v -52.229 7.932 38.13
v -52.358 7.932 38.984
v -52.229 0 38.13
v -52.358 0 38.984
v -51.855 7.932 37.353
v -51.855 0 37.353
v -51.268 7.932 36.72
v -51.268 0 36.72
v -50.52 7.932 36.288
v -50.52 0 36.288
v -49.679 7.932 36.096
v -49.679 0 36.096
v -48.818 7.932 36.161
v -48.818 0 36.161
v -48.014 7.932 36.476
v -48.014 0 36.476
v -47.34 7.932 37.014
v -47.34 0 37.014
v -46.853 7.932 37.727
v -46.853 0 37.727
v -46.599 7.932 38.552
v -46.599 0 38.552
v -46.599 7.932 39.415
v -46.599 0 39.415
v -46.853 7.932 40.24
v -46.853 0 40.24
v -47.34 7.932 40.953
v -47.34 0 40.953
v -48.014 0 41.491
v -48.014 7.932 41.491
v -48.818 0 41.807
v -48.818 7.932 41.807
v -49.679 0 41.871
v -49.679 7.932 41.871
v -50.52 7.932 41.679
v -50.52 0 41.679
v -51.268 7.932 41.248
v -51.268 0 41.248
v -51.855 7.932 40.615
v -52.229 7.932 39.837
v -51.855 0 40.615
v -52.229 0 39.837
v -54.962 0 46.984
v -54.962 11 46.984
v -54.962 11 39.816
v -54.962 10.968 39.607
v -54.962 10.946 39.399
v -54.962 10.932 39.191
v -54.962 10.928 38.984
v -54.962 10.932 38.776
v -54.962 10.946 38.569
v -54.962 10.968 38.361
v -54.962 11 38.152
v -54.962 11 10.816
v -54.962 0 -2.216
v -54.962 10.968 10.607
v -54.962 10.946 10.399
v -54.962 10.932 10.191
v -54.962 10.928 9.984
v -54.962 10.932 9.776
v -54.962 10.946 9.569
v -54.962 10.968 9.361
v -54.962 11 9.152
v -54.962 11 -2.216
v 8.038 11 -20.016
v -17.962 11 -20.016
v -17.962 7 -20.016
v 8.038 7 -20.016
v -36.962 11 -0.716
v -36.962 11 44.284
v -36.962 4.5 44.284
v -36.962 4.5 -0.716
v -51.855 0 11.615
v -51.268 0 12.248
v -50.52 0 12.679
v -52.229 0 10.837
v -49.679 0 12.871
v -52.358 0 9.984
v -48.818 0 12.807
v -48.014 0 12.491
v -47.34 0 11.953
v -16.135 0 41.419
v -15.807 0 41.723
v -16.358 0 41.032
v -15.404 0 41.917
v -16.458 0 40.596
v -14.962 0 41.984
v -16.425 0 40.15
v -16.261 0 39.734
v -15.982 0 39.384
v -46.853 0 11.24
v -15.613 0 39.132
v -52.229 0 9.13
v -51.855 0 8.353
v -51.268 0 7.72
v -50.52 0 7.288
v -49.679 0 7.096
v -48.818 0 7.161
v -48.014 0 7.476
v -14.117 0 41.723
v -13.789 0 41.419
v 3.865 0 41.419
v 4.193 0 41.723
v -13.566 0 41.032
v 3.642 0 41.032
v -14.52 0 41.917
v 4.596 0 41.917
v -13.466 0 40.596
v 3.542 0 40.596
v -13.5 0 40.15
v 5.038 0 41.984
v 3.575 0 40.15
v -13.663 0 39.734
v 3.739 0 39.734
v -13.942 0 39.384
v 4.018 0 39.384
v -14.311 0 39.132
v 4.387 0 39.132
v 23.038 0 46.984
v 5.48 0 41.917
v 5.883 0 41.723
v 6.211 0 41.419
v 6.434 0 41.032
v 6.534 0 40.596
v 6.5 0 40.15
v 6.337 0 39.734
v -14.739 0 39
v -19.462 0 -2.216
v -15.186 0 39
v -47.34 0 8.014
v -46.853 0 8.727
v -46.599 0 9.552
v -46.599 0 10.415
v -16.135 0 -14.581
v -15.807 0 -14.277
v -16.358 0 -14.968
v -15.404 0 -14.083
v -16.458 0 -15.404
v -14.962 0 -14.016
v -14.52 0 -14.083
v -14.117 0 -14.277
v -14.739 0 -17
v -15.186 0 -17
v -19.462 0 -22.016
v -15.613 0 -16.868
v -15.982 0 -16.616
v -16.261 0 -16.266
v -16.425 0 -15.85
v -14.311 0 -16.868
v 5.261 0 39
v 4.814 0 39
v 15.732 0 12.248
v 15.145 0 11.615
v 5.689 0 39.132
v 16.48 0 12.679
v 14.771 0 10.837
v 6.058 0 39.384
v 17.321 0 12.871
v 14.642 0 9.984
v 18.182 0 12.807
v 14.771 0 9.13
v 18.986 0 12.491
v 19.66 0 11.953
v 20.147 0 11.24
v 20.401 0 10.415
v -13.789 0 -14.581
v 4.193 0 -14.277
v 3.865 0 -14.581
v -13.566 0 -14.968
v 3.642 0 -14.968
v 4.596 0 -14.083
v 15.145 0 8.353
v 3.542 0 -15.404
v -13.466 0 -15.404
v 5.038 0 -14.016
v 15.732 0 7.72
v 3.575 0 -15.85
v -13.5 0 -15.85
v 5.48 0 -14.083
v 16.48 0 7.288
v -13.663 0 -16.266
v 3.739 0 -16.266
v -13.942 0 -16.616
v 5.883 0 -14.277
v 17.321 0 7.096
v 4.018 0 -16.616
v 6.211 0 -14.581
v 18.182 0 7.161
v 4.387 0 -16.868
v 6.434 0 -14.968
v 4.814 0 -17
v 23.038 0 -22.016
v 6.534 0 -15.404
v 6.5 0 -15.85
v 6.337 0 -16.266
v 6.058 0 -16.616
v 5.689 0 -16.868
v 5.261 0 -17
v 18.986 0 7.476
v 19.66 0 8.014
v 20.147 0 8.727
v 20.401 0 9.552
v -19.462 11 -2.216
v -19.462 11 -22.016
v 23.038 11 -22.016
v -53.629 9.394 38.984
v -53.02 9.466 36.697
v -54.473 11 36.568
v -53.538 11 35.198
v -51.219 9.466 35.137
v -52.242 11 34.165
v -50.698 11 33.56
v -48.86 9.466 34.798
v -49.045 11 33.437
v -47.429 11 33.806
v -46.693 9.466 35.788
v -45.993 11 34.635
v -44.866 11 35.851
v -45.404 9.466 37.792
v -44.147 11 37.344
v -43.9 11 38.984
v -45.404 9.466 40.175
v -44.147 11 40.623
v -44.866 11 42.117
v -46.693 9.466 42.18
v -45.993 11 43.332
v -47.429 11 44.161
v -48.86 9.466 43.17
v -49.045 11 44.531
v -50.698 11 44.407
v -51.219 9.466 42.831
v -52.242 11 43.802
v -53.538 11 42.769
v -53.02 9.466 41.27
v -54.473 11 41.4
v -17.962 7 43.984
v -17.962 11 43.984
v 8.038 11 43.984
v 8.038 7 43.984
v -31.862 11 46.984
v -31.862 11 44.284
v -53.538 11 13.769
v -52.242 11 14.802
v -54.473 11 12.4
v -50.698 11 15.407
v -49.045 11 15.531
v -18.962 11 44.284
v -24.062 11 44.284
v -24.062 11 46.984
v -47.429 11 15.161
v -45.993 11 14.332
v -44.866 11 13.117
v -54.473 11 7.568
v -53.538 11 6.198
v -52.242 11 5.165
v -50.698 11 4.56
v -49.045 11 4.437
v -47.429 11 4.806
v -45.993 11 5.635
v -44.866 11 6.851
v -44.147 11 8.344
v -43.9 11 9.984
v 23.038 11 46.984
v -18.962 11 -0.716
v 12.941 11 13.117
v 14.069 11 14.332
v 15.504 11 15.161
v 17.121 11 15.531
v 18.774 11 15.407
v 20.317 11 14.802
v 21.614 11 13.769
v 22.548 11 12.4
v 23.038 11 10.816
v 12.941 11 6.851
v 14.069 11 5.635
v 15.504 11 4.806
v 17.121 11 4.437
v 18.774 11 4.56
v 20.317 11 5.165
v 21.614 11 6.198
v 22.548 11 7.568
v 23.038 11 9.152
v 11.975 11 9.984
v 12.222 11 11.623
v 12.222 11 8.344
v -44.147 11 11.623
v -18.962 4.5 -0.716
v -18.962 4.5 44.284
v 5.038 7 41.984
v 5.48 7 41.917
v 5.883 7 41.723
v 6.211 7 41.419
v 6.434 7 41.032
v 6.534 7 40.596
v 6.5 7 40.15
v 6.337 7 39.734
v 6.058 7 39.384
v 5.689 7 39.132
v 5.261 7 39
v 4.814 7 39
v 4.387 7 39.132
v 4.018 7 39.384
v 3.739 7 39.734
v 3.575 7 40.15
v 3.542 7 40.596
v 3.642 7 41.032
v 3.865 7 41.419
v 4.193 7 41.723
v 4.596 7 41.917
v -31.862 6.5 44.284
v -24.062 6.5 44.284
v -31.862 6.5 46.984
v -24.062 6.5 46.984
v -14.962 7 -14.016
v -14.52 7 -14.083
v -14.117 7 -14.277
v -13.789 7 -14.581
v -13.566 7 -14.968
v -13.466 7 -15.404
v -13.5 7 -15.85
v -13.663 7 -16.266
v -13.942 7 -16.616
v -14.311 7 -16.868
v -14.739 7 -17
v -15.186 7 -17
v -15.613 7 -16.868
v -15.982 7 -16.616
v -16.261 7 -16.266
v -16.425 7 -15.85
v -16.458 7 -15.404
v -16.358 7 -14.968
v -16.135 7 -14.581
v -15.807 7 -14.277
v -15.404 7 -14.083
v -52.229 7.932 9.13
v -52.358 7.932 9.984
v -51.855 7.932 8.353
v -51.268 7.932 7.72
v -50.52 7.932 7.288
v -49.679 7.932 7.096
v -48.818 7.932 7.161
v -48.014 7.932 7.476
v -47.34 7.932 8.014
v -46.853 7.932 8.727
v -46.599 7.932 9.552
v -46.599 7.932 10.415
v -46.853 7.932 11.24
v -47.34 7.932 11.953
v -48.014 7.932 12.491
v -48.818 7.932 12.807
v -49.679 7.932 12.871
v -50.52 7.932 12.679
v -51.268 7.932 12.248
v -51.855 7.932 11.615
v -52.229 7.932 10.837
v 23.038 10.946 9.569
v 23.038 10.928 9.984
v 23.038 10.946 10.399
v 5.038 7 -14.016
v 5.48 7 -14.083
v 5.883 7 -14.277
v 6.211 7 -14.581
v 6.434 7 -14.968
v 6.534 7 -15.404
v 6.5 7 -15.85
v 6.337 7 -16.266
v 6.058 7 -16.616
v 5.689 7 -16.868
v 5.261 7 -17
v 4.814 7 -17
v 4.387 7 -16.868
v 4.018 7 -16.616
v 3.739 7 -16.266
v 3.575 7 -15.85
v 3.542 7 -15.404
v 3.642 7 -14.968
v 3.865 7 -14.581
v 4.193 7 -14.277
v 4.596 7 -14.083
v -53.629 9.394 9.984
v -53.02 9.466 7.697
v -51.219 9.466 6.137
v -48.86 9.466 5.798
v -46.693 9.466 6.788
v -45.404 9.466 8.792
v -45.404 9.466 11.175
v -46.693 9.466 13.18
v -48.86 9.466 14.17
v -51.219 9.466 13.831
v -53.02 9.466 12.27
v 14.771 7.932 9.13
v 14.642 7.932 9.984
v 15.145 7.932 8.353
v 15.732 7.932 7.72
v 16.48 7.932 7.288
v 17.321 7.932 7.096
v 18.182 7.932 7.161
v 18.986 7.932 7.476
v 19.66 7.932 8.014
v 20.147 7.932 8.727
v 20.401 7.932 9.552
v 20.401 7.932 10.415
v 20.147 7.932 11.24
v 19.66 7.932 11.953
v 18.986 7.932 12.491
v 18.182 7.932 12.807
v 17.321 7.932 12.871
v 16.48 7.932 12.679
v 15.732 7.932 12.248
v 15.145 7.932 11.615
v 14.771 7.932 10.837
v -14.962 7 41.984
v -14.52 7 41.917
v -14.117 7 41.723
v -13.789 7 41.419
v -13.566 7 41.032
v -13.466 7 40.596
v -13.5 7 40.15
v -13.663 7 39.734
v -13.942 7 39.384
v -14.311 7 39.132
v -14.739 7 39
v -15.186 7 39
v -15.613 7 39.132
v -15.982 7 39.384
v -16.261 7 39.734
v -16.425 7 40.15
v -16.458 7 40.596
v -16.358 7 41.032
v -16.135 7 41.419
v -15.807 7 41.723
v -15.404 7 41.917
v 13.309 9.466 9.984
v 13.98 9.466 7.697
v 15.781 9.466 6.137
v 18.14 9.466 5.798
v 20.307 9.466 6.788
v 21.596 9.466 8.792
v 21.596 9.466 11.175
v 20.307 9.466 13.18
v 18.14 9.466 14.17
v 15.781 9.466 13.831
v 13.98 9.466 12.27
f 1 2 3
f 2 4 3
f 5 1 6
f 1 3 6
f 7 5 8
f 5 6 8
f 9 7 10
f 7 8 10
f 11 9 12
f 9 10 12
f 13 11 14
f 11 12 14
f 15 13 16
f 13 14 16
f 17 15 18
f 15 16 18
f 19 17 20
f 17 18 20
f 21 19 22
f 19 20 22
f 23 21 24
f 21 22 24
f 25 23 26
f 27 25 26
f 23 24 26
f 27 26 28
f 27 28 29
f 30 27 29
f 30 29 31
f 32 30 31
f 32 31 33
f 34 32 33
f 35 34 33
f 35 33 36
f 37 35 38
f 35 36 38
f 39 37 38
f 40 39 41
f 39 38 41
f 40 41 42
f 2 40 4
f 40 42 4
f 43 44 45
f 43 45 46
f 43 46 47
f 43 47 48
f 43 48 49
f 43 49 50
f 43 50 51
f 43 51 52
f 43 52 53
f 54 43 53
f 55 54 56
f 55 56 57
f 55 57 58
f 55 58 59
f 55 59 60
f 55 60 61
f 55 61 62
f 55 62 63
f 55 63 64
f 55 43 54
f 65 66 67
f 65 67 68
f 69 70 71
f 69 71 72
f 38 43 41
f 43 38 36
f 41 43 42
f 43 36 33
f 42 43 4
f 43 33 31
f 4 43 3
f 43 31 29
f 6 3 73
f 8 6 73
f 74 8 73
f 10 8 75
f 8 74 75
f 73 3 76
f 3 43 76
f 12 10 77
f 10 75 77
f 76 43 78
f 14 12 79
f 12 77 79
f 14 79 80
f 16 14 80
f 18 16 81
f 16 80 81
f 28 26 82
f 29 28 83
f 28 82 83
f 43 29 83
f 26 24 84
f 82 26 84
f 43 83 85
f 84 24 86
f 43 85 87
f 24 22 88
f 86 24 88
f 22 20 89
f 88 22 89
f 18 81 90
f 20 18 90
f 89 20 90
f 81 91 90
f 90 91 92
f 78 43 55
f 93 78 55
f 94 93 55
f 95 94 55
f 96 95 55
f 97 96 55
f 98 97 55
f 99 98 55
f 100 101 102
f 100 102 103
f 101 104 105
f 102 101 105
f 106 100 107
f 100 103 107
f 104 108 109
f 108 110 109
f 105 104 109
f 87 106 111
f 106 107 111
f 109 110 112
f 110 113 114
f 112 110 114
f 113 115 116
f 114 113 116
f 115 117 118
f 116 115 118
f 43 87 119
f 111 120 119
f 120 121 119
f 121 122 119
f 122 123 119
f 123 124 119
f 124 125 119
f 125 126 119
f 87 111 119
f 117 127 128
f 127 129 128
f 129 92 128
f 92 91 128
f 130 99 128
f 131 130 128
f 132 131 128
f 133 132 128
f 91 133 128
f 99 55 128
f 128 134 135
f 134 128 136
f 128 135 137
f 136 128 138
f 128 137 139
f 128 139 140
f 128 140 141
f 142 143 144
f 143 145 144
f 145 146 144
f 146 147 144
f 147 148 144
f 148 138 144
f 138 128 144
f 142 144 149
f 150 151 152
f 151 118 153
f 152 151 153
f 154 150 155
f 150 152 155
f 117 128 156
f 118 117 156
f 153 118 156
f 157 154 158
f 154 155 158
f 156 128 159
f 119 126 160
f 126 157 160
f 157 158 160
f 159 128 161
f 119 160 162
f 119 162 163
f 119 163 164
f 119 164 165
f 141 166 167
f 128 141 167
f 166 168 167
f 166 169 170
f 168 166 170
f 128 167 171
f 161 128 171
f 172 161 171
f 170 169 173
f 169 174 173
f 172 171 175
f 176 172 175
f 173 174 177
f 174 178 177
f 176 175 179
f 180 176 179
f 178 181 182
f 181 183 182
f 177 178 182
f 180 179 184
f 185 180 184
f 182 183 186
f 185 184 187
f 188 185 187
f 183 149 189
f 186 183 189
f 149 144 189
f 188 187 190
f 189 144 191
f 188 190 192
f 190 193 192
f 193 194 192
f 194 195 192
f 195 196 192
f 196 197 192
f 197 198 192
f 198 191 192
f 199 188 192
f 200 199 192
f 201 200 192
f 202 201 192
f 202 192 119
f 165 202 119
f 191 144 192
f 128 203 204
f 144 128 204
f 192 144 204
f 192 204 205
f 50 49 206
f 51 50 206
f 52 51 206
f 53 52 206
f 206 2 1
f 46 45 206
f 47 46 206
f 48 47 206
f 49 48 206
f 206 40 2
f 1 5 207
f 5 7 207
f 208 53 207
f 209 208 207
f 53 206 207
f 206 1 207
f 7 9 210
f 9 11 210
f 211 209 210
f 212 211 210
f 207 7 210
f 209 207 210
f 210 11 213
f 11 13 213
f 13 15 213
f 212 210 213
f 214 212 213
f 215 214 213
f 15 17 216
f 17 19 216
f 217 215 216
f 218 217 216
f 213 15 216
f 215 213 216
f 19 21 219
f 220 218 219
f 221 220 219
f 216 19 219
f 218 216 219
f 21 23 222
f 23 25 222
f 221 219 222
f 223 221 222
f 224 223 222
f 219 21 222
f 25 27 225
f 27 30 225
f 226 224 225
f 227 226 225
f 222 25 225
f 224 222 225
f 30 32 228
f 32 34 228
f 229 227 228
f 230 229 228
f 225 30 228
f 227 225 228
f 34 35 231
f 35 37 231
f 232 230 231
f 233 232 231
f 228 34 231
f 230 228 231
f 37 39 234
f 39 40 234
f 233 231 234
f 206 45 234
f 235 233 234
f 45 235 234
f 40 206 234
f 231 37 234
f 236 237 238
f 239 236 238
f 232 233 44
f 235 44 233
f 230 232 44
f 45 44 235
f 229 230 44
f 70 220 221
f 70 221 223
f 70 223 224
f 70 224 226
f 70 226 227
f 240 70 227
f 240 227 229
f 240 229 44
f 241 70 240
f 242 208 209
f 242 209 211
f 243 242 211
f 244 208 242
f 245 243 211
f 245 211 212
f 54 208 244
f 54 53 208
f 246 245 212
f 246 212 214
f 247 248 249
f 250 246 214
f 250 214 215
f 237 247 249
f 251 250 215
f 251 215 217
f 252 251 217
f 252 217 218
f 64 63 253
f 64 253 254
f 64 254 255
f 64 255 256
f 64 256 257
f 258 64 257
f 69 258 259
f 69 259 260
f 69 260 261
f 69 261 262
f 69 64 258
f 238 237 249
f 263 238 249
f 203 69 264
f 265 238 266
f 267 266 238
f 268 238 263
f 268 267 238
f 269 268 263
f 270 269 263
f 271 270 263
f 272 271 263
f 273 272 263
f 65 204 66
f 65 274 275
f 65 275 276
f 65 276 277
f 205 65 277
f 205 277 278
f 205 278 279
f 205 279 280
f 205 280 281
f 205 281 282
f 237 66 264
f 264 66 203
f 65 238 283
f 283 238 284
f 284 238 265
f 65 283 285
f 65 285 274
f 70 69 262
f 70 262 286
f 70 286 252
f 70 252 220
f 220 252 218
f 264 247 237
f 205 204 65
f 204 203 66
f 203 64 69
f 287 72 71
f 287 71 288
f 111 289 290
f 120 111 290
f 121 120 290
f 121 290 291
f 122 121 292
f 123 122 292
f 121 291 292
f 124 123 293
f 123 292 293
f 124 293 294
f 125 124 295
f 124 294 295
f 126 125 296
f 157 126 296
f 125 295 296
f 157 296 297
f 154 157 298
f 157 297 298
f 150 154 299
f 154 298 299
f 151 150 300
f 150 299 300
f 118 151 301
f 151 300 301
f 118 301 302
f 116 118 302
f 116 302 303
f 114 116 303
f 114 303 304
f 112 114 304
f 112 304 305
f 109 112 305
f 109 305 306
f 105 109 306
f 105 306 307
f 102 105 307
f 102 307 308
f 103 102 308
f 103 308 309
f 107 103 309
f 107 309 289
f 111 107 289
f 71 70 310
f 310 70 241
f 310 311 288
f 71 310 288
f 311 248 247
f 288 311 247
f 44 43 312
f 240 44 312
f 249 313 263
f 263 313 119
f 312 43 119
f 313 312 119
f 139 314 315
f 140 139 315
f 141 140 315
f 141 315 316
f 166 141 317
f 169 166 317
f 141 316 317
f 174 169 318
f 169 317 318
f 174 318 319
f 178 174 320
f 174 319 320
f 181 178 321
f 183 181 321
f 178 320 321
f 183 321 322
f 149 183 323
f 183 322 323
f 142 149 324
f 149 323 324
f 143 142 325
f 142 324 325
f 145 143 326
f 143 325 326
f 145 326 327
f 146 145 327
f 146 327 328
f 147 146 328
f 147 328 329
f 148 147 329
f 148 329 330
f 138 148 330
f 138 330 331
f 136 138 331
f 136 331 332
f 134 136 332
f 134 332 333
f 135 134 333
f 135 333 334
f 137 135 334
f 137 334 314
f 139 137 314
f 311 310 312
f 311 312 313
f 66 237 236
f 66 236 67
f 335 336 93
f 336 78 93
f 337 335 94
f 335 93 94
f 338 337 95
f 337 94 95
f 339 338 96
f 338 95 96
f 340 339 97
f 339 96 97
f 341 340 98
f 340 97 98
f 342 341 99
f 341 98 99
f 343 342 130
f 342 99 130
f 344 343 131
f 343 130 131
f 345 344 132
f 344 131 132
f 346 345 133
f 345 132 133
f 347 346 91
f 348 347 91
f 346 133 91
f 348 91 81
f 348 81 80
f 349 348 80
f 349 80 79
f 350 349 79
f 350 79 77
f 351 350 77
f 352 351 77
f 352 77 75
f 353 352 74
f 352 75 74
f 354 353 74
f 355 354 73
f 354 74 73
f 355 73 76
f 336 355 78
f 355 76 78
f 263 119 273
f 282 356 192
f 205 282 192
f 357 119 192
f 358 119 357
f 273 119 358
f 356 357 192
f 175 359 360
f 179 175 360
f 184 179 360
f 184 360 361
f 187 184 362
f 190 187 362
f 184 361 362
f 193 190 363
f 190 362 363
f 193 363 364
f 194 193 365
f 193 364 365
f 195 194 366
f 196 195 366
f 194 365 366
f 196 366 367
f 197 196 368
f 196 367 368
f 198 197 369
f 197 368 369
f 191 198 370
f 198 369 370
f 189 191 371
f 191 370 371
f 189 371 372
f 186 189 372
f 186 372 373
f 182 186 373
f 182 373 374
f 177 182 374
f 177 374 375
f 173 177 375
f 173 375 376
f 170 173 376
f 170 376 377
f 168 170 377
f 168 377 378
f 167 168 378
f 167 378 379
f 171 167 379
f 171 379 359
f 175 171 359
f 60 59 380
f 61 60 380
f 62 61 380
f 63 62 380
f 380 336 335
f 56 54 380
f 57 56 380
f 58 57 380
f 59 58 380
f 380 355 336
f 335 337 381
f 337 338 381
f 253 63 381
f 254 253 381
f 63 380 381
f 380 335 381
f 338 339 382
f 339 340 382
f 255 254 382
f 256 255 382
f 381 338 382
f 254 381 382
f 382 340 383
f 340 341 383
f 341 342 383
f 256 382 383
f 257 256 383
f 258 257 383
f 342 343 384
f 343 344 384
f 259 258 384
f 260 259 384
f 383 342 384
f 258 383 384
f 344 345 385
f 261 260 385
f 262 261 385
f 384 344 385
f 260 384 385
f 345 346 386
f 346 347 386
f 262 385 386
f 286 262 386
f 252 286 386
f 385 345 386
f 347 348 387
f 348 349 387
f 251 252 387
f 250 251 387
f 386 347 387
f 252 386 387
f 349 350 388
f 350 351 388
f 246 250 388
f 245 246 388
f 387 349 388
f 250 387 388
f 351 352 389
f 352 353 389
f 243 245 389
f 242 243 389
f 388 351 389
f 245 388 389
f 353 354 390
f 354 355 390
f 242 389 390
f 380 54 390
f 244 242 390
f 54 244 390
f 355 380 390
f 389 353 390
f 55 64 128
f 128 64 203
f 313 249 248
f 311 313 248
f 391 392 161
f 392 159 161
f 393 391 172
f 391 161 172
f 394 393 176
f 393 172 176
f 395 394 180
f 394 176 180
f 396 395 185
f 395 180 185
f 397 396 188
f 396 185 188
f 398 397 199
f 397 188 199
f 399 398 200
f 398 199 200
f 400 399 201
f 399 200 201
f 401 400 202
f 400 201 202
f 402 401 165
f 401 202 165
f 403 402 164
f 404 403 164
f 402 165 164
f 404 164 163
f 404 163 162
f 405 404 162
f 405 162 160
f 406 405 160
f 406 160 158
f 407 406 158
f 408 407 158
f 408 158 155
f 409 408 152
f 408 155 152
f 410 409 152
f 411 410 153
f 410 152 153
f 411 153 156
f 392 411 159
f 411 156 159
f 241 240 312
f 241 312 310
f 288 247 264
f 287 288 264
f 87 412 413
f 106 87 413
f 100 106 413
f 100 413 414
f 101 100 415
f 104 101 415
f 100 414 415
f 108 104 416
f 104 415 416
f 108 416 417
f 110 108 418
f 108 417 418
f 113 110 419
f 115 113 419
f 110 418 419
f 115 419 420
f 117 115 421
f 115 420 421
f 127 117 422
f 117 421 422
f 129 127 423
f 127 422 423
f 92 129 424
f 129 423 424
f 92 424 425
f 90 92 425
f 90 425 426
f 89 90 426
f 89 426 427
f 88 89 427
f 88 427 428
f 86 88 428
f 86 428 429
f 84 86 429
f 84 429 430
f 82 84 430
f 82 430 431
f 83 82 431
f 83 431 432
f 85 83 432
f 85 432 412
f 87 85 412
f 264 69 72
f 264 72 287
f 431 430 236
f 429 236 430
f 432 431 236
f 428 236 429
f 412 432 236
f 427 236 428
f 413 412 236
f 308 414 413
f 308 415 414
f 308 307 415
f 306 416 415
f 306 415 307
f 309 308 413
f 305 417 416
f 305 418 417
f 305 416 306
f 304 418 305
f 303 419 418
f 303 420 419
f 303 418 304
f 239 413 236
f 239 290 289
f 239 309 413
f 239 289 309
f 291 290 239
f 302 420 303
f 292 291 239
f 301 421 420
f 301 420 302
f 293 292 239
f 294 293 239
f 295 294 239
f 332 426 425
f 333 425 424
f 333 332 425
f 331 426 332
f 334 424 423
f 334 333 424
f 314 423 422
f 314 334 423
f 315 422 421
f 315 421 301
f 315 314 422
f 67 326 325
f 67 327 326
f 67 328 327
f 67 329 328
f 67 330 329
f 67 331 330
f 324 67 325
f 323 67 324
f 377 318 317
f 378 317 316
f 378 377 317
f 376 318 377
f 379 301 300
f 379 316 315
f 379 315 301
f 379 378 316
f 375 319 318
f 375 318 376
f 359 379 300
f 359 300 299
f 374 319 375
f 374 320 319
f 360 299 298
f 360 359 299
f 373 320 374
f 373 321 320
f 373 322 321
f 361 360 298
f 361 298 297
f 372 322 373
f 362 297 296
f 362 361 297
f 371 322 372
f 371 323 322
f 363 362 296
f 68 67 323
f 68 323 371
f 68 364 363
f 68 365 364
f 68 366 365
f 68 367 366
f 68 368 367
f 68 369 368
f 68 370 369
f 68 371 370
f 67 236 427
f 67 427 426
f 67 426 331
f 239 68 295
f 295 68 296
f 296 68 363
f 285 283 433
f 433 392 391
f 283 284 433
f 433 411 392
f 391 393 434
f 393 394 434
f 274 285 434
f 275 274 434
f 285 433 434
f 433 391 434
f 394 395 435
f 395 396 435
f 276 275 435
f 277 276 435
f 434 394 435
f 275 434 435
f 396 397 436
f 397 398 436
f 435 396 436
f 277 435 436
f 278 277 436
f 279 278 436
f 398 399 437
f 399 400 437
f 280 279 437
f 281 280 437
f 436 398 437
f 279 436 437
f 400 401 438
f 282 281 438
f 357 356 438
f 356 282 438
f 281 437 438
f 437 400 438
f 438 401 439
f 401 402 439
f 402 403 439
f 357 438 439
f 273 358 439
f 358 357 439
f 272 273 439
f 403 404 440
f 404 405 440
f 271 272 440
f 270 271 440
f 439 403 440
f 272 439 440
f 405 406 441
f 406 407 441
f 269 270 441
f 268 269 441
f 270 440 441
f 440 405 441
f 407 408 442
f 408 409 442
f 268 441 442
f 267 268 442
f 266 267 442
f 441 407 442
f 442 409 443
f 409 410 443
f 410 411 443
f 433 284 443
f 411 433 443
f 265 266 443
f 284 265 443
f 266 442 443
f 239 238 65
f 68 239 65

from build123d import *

# Parameters (mm, degrees)
SKETCH1_W                                       = 78
SKETCH1_H                                       = 69
BOSS_EXTRUDE1_DEPTH                             = 11
SKETCH4_W                                       = 18
SKETCH4_H                                       = 45
CUT_EXTRUDE2_DEPTH                              = 6.5
SKETCH5_W                                       = 7.8
SKETCH5_H                                       = 2.7
CUT_EXTRUDE3_DEPTH                              = 4.5
SKETCH6_W                                       = 26
SKETCH6_H                                       = 64
CUT_EXTRUDE4_DEPTH                              = 4
SKETCH8_R                                       = 1.5
CUT_EXTRUDE5_DEPTH                              = 73.645065829
CSK_FOR_12_FLAT_HEAD_MACHINE_SCREW1_D           = 5.7912
CSK_FOR_12_FLAT_HEAD_MACHINE_SCREW1_CSINK_D     = 11.1252
CSK_FOR_12_FLAT_HEAD_MACHINE_SCREW1_CSINK_ANGLE = 82
SKETCH24_W                                      = 35.5
SKETCH24_H                                      = 19.8
CUT_EXTRUDE7_DEPTH                              = 74.138947144


with BuildPart() as part:
    # Sketch1 → Boss-Extrude1 (new body)
    with BuildSketch(Plane(origin=(0, 0, 0), x_dir=(1, 0, 0), z_dir=(0, 1, 0))):
        with Locations((-15.96214511, -12.483701367)):
            Rectangle(SKETCH1_W, SKETCH1_H)
    extrude(amount=BOSS_EXTRUDE1_DEPTH)

    # Sketch4 → Cut-Extrude2 (cut)
    with BuildSketch(Plane(origin=(0, 11, 0), x_dir=(1, 0, 0), z_dir=(0, 1, 0))):
        with Locations((-27.96214511, -21.783701367)):
            Rectangle(SKETCH4_W, SKETCH4_H)
    extrude(amount=-CUT_EXTRUDE2_DEPTH, mode=Mode.SUBTRACT)

    # Sketch5 → Cut-Extrude3 (cut)
    with BuildSketch(Plane(origin=(0, 11, 0), x_dir=(1, 0, 0), z_dir=(0, 1, 0))):
        with Locations((-27.96214511, -45.633701367)):
            Rectangle(SKETCH5_W, SKETCH5_H)
    extrude(amount=-CUT_EXTRUDE3_DEPTH, mode=Mode.SUBTRACT)

    # Sketch6 → Cut-Extrude4 (cut)
    with BuildSketch(Plane(origin=(0, 11, 0), x_dir=(1, 0, 0), z_dir=(0, 1, 0))):
        with Locations((-4.96214511, -11.983701367)):
            Rectangle(SKETCH6_W, SKETCH6_H)
    extrude(amount=-CUT_EXTRUDE4_DEPTH, mode=Mode.SUBTRACT)

    # Sketch8 → Cut-Extrude5 (cut, through all)
    with BuildSketch(Plane(origin=(0, 7, 0), x_dir=(1, 0, 0), z_dir=(0, 1, 0))):
        with Locations(Location((5.03785489, -40.483701367, 0), (0, 0, 270))):
            Circle(SKETCH8_R)
        with Locations(Location((-14.96214511, -40.483701367, 0), (0, 0, 270))):
            Circle(SKETCH8_R)
        with Locations(Location((-14.96214511, 15.516298633, 0), (0, 0, 270))):
            Circle(SKETCH8_R)
        with Locations(Location((5.03785489, 15.516298633, 0), (0, 0, 270))):
            Circle(SKETCH8_R)
    extrude(amount=-CUT_EXTRUDE5_DEPTH, mode=Mode.SUBTRACT)

    # CSK for #12 Flat Head Machine Screw1 (through all)
    with Locations(Plane(origin=(0, 11, 0), x_dir=(1, 0, 0), z_dir=(0, 1, 0))):
        with Locations((-49.46214511, -38.983701367), (-49.46214511, -9.983701367), (17.53785489, -9.983701367)):
            CounterSinkHole(CSK_FOR_12_FLAT_HEAD_MACHINE_SCREW1_D / 2, CSK_FOR_12_FLAT_HEAD_MACHINE_SCREW1_CSINK_D / 2, counter_sink_angle=CSK_FOR_12_FLAT_HEAD_MACHINE_SCREW1_CSINK_ANGLE)

    # Sketch24 → Cut-Extrude7 (cut, through all)
    with BuildSketch(Plane(origin=(0, 11, 0), x_dir=(1, 0, 0), z_dir=(0, 1, 0))):
        with Locations((-37.21214511, 12.116298633)):
            Rectangle(SKETCH24_W, SKETCH24_H)
    extrude(amount=-CUT_EXTRUDE7_DEPTH, mode=Mode.SUBTRACT)


solid = part.part
